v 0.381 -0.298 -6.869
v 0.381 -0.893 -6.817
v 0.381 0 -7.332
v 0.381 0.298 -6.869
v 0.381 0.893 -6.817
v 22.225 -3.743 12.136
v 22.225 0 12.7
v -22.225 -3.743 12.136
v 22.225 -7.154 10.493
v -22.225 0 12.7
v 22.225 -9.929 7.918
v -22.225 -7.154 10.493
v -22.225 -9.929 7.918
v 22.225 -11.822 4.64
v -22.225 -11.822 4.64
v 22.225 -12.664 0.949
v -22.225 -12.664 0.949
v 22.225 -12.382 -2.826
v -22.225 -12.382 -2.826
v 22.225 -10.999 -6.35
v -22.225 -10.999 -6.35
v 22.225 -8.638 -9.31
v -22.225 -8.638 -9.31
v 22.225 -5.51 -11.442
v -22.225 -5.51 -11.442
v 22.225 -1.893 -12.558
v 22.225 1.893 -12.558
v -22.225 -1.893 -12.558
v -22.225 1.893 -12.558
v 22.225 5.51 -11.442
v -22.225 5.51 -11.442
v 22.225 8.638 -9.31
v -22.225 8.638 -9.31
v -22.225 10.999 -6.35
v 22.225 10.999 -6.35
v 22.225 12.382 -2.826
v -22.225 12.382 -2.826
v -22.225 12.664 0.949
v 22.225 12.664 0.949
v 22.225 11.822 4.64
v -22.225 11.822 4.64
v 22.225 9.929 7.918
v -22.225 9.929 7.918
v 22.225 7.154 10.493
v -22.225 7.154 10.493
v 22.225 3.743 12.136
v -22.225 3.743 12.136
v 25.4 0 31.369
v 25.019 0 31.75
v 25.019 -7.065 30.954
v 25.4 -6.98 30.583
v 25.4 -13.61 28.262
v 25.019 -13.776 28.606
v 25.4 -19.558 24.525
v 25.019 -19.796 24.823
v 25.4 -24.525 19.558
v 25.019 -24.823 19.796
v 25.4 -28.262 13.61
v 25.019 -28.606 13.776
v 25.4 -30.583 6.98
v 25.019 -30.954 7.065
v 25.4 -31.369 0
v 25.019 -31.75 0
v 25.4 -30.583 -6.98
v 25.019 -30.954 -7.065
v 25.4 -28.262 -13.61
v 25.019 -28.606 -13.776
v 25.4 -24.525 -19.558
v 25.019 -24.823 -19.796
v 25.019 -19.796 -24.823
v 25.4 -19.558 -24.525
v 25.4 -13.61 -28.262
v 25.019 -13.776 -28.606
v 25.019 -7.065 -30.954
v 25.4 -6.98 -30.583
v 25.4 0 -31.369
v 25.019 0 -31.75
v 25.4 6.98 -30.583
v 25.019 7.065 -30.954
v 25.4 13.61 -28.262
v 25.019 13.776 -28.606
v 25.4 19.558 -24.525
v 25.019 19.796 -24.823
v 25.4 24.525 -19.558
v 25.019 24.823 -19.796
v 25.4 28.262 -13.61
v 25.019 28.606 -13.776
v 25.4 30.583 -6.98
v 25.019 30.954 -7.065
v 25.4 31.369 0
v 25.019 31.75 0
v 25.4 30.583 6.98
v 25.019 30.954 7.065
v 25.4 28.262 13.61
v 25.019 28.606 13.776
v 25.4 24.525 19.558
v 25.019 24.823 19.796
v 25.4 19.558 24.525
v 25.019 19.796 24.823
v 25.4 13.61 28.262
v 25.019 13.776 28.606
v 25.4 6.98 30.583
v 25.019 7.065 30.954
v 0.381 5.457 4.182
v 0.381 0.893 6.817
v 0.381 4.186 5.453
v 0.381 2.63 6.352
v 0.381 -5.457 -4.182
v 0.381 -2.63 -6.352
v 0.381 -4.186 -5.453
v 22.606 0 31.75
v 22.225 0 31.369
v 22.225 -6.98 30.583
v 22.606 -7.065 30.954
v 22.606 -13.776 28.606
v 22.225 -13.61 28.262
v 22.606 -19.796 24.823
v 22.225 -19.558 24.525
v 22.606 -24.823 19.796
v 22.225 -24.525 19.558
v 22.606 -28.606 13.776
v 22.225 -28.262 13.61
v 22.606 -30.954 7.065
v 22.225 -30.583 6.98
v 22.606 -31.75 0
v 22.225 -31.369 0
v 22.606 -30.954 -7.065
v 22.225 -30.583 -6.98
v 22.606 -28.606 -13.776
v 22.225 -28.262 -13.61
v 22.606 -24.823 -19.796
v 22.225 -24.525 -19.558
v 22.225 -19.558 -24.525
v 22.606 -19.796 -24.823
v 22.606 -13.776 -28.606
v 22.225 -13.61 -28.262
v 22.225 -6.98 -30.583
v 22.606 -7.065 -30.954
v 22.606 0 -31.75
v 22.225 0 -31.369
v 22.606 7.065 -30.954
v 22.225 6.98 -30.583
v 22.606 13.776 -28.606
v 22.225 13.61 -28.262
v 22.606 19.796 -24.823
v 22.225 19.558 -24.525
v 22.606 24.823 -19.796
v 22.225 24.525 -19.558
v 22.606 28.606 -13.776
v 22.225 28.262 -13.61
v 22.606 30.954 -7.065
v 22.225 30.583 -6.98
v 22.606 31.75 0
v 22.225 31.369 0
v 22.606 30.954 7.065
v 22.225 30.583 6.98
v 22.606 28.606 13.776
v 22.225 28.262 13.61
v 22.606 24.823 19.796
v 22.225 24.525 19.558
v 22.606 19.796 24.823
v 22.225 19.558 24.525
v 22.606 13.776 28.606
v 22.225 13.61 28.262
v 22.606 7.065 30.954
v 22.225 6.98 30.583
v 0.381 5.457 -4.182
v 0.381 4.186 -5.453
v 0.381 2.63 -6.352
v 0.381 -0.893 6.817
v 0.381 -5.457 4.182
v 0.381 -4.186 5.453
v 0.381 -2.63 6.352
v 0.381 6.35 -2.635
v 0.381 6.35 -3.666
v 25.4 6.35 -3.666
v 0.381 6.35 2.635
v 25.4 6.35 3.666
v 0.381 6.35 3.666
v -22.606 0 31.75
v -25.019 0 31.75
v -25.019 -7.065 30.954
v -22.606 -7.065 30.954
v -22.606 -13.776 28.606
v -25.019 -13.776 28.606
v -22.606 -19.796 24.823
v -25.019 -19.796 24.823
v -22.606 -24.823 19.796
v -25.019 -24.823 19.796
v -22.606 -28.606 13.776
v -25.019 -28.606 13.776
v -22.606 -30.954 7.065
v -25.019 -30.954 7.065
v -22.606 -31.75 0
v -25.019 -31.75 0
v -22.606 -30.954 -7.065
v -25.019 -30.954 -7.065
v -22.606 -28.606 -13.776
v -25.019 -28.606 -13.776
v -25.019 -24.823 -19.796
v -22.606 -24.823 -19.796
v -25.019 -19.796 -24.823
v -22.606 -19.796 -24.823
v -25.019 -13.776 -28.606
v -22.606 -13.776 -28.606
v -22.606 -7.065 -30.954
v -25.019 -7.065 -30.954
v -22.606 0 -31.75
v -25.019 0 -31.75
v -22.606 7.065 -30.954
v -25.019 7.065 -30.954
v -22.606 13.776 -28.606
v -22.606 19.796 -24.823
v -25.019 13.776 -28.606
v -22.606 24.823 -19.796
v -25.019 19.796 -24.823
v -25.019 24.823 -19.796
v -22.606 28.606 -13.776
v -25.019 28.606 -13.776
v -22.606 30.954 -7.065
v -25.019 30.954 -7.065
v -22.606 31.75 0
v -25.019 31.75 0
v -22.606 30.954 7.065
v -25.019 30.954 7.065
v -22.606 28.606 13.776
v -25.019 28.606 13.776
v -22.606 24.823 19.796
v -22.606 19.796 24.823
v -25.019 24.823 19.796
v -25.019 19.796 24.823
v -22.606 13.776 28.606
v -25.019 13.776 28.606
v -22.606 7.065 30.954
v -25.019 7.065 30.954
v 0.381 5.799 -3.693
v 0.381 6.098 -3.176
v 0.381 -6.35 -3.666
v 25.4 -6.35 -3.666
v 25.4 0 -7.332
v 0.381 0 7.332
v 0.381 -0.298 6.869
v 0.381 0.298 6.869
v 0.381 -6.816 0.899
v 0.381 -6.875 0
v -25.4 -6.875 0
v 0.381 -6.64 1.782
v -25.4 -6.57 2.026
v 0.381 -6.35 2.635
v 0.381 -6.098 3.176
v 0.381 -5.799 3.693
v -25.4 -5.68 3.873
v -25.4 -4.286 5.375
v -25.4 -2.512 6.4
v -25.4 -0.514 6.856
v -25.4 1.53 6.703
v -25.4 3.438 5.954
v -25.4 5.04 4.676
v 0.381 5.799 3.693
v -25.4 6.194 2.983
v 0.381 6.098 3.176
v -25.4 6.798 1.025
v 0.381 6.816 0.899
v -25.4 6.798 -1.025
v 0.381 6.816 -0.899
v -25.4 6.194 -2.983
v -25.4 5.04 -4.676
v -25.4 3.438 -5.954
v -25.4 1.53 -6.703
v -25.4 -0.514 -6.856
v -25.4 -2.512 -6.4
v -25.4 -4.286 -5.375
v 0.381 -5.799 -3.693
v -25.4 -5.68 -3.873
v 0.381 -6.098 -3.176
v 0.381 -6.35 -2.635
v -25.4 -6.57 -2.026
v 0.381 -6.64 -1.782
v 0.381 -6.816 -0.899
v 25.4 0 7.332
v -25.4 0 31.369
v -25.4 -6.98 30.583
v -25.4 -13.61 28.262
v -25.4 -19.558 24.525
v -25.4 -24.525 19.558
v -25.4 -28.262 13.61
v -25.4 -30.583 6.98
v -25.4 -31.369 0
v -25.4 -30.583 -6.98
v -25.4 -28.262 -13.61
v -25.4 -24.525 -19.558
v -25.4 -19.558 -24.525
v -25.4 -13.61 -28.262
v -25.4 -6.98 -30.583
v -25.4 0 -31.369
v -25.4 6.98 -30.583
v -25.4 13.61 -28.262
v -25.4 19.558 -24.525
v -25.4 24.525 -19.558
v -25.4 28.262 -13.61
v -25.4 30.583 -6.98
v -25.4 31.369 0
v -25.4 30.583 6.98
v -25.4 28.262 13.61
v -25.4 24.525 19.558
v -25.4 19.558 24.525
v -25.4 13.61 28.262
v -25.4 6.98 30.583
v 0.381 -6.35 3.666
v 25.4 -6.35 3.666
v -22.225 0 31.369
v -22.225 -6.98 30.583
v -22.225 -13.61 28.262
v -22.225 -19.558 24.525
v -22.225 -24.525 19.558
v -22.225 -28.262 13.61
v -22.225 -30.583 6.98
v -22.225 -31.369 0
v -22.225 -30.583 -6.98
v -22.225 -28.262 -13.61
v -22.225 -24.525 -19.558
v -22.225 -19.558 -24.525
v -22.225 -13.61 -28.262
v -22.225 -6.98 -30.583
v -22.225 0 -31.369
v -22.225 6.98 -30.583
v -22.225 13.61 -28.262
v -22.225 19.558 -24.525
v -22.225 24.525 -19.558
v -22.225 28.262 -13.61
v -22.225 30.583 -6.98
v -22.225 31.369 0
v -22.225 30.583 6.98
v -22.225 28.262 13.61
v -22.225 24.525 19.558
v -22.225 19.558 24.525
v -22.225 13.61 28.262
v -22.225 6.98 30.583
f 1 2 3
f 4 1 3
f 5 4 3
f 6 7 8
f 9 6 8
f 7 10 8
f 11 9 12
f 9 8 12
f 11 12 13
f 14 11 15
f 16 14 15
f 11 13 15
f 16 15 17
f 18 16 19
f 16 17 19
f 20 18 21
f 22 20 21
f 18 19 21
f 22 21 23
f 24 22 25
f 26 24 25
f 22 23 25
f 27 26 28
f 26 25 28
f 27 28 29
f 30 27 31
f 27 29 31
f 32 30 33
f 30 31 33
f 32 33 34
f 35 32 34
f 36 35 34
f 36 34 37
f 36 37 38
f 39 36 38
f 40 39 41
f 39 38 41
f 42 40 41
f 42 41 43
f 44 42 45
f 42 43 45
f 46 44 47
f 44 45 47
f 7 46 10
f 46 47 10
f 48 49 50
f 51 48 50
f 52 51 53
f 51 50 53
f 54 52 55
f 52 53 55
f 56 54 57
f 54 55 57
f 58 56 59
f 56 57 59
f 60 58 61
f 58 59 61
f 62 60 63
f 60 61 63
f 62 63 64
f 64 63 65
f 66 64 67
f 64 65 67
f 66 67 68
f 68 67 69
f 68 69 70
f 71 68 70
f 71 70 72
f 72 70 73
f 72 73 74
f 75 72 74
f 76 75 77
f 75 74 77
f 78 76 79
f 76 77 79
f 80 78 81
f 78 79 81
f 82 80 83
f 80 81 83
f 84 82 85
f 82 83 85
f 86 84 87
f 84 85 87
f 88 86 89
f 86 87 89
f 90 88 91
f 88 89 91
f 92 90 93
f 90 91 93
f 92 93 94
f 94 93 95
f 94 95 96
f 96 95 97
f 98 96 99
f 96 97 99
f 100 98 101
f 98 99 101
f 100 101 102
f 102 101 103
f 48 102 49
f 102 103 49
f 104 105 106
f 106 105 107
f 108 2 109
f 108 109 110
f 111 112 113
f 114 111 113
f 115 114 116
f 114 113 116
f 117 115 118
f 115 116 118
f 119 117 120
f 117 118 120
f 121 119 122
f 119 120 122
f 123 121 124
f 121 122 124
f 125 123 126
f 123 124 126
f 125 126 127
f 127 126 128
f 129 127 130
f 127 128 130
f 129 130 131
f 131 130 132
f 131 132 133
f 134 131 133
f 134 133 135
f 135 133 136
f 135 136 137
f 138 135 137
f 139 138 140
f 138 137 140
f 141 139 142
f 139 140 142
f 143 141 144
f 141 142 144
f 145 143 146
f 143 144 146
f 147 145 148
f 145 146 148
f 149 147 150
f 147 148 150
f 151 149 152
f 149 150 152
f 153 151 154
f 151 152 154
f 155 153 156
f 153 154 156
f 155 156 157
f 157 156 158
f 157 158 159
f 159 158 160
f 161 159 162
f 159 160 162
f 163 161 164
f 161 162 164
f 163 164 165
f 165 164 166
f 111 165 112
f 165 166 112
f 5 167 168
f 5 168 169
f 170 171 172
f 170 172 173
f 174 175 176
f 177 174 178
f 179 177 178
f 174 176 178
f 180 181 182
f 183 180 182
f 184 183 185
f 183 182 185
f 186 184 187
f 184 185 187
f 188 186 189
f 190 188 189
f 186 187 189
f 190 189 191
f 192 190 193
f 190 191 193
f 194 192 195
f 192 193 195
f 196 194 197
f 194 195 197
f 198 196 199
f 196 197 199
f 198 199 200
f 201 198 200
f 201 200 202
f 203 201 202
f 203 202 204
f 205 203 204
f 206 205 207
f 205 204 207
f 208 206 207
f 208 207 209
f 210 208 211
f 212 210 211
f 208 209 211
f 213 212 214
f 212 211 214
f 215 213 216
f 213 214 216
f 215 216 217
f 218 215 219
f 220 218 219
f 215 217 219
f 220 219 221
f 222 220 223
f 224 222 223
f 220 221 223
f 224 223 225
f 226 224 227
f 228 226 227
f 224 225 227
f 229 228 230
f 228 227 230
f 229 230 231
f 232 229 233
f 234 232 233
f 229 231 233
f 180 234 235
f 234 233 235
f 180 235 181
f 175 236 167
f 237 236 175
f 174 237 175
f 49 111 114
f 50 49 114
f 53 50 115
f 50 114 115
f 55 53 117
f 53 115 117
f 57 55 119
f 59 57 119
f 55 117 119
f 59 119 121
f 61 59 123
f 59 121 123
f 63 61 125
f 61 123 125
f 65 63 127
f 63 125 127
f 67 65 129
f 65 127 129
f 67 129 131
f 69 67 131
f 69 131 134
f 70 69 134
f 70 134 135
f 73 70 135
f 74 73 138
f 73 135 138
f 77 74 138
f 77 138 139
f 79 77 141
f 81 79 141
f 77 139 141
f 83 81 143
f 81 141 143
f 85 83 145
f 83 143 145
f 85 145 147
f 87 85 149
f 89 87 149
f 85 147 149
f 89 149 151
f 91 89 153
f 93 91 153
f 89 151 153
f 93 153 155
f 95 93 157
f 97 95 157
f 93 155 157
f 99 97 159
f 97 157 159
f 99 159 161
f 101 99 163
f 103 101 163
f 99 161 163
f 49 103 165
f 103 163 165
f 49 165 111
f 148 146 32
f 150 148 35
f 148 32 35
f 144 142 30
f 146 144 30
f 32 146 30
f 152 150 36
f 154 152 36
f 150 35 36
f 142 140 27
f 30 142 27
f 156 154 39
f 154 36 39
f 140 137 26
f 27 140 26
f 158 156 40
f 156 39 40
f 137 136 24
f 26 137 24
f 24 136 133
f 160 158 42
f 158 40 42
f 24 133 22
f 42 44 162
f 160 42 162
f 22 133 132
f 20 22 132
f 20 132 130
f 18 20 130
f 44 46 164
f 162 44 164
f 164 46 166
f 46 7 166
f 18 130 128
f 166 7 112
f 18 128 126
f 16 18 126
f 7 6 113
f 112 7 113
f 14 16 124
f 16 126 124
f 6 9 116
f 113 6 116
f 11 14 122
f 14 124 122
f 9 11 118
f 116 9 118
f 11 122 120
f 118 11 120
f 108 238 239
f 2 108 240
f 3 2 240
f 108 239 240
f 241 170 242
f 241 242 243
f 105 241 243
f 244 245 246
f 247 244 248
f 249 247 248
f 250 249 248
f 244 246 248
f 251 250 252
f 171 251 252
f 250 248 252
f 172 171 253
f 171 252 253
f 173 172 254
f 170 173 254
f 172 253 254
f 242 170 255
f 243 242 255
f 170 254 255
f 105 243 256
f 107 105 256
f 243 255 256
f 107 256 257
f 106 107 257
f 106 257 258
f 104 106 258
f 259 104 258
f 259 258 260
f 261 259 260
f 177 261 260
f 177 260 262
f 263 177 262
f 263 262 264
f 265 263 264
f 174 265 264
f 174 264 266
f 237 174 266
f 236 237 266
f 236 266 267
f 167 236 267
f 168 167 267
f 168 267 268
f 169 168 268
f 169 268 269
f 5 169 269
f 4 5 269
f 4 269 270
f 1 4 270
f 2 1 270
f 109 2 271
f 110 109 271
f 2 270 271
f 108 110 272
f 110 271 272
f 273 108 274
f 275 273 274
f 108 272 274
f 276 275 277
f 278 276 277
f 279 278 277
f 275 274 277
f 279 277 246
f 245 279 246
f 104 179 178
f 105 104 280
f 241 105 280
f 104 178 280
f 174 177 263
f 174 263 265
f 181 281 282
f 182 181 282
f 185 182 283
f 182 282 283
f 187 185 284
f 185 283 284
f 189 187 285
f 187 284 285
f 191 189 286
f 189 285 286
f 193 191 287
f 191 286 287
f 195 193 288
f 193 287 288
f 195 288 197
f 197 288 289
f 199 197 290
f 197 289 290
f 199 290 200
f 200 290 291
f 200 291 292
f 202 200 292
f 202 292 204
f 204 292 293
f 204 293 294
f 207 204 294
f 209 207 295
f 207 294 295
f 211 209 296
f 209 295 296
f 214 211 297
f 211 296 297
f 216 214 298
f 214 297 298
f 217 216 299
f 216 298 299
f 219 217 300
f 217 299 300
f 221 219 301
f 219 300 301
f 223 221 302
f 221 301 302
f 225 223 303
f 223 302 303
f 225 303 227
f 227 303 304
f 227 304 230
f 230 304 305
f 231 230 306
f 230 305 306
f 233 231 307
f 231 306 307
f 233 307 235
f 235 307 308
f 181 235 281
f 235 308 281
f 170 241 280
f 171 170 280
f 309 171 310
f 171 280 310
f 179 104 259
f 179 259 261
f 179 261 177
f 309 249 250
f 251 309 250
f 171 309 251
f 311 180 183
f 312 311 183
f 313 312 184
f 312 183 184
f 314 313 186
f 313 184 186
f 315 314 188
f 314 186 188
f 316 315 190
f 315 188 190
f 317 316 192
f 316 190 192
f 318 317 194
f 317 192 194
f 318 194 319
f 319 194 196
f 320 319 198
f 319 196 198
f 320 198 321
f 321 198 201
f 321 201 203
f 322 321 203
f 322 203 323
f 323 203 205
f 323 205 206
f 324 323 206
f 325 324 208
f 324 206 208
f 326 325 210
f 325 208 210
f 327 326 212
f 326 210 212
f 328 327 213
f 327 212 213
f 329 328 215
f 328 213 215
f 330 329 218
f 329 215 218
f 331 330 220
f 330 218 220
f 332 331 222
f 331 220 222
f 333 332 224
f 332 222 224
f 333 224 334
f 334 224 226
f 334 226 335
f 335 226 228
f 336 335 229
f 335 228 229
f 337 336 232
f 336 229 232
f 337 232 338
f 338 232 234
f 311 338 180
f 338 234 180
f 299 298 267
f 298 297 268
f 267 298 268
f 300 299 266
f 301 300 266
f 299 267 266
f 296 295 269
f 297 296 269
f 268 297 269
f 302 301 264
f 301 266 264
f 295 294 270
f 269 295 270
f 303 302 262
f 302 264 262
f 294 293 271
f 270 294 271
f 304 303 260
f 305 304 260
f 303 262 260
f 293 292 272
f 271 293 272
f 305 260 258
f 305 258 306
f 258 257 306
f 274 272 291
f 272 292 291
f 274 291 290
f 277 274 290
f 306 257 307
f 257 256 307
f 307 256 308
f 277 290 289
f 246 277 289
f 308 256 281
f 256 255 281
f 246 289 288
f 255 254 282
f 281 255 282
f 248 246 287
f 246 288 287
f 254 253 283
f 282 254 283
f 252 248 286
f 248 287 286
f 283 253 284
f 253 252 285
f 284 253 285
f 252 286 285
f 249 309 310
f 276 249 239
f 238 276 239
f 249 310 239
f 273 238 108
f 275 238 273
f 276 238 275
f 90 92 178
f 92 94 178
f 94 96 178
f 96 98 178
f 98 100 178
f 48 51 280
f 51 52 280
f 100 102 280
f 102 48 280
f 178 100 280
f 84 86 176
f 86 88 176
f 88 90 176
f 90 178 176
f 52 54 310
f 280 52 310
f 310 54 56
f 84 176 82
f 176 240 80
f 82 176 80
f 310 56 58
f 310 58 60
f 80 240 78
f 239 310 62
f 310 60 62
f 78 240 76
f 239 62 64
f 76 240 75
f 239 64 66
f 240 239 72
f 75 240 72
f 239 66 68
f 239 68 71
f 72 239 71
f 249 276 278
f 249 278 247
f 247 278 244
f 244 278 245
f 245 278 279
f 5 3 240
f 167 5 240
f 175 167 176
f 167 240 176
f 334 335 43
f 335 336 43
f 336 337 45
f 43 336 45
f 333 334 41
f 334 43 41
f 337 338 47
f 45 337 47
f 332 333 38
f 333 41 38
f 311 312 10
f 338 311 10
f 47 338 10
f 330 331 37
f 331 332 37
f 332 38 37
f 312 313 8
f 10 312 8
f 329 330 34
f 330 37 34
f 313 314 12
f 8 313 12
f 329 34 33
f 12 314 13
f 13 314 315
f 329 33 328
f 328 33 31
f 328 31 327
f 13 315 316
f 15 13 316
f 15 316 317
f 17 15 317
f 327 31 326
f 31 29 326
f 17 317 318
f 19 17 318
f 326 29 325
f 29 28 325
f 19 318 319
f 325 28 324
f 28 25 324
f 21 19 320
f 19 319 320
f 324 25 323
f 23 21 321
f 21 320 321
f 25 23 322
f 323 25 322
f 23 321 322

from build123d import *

# Parameters (mm, degrees)
F2_SIZE  = 0.381
F4_DEPTH = 25.019
F5_R     = 6.875
F6_DEPTH = 25.781


with BuildPart() as f1:
    # F0 (on Front) → F1 (revolve)
    with BuildSketch(Plane.XZ):
        Polygon((22.225, 12.7), (-22.225, 12.7), (-22.225, 31.75), (-25.4, 31.75), (-25.4, 0), (25.4, 0), (25.4, 31.75), (22.225, 31.75), align=None)
    revolve(axis=Axis((0, 0, 0), (1, 0, 0)))

    # F2
    f2_edges = [f1.edges().sort_by_distance(p)[0] for p in [
        (-22.225, 0, -31.75),
        (-25.4, 0, -31.75),
        (22.225, 0, -31.75),
        (25.4, 0, -31.75),
    ]]
    chamfer(f2_edges, length=F2_SIZE)

    # F3 (on face) → F4 (cut)
    with BuildSketch(Plane.YZ.offset(25.4)):
        Polygon((6.35, -3.666174), (6.35, 3.666174), (0, 7.332348), (-6.35, 3.666174), (-6.35, -3.666174), (0, -7.332348), align=None)
    extrude(amount=-F4_DEPTH, mode=Mode.SUBTRACT)

    # F5 (on face) → F6 (cut)
    with BuildSketch(Plane(origin=(-25.4, 0, 0), x_dir=(0, -1, 0), z_dir=(-1, 0, 0))):
        Circle(F5_R)
    extrude(amount=-F6_DEPTH, mode=Mode.SUBTRACT)


solid = f1.part
